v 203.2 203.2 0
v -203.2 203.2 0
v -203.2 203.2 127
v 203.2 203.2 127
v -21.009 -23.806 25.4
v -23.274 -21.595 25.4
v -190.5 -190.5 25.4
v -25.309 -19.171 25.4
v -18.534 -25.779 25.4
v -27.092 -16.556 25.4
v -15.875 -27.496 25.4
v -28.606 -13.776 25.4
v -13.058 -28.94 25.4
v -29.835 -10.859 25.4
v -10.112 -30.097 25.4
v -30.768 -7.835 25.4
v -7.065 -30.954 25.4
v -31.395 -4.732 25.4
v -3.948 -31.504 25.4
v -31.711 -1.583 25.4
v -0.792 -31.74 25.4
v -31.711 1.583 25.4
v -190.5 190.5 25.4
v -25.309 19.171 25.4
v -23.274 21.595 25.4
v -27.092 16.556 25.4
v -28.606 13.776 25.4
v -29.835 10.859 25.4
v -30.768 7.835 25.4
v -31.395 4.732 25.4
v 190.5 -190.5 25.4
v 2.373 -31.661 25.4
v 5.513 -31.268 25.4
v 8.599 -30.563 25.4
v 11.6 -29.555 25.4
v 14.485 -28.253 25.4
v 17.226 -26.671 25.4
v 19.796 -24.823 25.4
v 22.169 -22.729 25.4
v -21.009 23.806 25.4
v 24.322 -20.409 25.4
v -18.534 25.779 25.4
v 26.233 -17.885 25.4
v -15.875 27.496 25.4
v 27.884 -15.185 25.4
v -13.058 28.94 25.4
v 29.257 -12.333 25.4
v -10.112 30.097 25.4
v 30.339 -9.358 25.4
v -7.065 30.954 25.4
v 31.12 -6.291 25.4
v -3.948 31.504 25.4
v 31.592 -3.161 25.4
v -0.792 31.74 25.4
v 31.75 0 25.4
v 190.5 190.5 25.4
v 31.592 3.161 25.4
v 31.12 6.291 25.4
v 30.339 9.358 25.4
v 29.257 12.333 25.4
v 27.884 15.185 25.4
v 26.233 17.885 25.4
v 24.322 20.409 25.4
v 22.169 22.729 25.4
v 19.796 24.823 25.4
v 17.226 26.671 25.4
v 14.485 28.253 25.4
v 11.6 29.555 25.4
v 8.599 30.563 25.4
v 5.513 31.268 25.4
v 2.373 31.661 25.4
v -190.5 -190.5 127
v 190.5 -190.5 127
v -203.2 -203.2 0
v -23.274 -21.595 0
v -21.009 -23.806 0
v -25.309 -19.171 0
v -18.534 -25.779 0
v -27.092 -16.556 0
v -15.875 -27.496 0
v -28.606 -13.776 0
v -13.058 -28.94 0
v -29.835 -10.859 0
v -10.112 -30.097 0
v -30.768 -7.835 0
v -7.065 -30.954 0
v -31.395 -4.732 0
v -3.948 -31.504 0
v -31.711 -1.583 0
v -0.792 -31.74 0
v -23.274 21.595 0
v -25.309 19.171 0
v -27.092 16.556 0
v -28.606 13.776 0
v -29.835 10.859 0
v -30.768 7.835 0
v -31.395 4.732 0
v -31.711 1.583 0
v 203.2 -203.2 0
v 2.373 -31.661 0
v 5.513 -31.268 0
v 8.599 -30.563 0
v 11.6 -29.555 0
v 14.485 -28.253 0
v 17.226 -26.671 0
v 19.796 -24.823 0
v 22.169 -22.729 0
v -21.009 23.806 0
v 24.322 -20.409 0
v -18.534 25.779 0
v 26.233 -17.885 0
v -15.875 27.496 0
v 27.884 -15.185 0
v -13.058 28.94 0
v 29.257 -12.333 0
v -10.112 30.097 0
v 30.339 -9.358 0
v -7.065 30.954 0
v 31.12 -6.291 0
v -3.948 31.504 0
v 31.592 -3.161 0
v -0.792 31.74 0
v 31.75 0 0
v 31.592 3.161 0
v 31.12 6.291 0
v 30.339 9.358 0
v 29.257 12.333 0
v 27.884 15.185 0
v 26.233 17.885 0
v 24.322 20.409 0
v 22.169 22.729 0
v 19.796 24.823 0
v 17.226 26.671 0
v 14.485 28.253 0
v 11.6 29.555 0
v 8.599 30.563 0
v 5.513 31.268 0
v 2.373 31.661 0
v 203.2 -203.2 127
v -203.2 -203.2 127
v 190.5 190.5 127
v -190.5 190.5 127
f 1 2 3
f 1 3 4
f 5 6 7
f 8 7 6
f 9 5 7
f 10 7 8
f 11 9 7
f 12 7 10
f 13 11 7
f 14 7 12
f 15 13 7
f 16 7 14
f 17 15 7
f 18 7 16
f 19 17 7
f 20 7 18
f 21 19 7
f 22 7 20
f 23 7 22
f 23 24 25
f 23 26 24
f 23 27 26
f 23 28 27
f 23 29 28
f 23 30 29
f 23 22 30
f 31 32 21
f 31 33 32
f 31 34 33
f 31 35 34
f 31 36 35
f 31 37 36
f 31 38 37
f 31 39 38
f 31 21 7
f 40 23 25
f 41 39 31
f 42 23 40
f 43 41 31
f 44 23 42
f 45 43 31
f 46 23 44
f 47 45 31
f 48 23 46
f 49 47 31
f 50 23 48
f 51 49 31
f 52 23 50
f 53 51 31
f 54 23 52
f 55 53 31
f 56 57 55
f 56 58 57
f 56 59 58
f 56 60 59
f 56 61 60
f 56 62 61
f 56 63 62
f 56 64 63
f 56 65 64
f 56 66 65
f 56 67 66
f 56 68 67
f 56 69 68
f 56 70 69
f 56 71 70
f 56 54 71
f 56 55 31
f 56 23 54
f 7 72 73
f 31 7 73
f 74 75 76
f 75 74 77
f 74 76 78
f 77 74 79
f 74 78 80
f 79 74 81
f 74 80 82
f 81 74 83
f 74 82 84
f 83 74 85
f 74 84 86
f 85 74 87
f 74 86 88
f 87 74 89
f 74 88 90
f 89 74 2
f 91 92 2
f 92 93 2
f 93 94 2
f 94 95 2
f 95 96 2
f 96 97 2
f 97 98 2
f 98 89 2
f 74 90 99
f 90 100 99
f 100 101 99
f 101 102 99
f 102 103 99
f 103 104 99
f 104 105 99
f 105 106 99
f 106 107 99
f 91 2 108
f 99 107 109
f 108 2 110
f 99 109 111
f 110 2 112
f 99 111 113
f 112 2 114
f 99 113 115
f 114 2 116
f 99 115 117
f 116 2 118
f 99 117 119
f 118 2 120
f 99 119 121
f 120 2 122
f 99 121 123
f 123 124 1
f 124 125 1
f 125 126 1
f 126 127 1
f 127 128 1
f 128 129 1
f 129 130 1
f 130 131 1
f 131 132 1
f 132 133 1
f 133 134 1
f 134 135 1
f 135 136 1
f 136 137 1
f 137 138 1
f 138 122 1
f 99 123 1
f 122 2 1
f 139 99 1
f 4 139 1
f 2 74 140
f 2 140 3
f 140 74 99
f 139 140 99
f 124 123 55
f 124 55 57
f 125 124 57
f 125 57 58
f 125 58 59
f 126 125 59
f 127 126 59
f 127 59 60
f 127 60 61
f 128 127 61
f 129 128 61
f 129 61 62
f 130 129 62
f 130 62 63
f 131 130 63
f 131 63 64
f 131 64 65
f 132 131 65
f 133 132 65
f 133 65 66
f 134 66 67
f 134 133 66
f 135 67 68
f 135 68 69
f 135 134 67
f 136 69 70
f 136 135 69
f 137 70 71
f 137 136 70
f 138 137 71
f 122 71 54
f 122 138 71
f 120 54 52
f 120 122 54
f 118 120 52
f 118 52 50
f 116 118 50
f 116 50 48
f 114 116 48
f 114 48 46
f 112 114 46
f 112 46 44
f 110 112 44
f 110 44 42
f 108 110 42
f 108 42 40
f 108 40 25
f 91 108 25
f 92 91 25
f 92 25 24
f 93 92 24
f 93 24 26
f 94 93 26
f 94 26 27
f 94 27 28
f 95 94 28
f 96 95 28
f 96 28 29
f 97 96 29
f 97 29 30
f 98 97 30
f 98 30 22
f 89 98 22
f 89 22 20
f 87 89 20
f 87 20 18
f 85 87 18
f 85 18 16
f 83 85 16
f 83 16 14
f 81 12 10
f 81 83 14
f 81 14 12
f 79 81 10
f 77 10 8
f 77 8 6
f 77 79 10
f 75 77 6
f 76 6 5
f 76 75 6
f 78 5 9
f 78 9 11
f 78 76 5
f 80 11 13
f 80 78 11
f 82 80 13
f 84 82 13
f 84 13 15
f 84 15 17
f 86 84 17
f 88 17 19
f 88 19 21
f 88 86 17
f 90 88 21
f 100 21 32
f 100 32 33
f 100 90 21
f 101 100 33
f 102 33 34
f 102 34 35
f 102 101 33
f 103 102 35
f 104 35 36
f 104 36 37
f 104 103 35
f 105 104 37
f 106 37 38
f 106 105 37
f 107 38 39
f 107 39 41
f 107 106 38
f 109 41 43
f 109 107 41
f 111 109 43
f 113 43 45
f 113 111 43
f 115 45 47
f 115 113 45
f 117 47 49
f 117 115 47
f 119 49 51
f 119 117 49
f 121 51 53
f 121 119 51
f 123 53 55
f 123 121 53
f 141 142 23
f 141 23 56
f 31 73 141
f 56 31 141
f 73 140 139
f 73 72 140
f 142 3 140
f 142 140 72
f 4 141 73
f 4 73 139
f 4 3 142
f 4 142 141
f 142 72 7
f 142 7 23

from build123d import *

# Parameters (mm, degrees)
F0_W     = 406.4
F0_H     = 406.4
F0_R     = 31.75
F1_DEPTH = 127
F2_W     = 381
F2_H     = 381
F2_R     = 31.75
F3_DEPTH = 101.6


with BuildPart() as f1:
    # F0 (on Top) → F1 (new body)
    with BuildSketch(Plane.XY):
        Rectangle(F0_W, F0_H)
        Circle(F0_R, mode=Mode.SUBTRACT)
    extrude(amount=F1_DEPTH)

    # F2 (on face) → F3 (cut)
    with BuildSketch(Plane.XY.offset(127)):
        Rectangle(F2_W, F2_H)
        Circle(F2_R, mode=Mode.SUBTRACT)
    extrude(amount=-F3_DEPTH, mode=Mode.SUBTRACT)


solid = f1.part
